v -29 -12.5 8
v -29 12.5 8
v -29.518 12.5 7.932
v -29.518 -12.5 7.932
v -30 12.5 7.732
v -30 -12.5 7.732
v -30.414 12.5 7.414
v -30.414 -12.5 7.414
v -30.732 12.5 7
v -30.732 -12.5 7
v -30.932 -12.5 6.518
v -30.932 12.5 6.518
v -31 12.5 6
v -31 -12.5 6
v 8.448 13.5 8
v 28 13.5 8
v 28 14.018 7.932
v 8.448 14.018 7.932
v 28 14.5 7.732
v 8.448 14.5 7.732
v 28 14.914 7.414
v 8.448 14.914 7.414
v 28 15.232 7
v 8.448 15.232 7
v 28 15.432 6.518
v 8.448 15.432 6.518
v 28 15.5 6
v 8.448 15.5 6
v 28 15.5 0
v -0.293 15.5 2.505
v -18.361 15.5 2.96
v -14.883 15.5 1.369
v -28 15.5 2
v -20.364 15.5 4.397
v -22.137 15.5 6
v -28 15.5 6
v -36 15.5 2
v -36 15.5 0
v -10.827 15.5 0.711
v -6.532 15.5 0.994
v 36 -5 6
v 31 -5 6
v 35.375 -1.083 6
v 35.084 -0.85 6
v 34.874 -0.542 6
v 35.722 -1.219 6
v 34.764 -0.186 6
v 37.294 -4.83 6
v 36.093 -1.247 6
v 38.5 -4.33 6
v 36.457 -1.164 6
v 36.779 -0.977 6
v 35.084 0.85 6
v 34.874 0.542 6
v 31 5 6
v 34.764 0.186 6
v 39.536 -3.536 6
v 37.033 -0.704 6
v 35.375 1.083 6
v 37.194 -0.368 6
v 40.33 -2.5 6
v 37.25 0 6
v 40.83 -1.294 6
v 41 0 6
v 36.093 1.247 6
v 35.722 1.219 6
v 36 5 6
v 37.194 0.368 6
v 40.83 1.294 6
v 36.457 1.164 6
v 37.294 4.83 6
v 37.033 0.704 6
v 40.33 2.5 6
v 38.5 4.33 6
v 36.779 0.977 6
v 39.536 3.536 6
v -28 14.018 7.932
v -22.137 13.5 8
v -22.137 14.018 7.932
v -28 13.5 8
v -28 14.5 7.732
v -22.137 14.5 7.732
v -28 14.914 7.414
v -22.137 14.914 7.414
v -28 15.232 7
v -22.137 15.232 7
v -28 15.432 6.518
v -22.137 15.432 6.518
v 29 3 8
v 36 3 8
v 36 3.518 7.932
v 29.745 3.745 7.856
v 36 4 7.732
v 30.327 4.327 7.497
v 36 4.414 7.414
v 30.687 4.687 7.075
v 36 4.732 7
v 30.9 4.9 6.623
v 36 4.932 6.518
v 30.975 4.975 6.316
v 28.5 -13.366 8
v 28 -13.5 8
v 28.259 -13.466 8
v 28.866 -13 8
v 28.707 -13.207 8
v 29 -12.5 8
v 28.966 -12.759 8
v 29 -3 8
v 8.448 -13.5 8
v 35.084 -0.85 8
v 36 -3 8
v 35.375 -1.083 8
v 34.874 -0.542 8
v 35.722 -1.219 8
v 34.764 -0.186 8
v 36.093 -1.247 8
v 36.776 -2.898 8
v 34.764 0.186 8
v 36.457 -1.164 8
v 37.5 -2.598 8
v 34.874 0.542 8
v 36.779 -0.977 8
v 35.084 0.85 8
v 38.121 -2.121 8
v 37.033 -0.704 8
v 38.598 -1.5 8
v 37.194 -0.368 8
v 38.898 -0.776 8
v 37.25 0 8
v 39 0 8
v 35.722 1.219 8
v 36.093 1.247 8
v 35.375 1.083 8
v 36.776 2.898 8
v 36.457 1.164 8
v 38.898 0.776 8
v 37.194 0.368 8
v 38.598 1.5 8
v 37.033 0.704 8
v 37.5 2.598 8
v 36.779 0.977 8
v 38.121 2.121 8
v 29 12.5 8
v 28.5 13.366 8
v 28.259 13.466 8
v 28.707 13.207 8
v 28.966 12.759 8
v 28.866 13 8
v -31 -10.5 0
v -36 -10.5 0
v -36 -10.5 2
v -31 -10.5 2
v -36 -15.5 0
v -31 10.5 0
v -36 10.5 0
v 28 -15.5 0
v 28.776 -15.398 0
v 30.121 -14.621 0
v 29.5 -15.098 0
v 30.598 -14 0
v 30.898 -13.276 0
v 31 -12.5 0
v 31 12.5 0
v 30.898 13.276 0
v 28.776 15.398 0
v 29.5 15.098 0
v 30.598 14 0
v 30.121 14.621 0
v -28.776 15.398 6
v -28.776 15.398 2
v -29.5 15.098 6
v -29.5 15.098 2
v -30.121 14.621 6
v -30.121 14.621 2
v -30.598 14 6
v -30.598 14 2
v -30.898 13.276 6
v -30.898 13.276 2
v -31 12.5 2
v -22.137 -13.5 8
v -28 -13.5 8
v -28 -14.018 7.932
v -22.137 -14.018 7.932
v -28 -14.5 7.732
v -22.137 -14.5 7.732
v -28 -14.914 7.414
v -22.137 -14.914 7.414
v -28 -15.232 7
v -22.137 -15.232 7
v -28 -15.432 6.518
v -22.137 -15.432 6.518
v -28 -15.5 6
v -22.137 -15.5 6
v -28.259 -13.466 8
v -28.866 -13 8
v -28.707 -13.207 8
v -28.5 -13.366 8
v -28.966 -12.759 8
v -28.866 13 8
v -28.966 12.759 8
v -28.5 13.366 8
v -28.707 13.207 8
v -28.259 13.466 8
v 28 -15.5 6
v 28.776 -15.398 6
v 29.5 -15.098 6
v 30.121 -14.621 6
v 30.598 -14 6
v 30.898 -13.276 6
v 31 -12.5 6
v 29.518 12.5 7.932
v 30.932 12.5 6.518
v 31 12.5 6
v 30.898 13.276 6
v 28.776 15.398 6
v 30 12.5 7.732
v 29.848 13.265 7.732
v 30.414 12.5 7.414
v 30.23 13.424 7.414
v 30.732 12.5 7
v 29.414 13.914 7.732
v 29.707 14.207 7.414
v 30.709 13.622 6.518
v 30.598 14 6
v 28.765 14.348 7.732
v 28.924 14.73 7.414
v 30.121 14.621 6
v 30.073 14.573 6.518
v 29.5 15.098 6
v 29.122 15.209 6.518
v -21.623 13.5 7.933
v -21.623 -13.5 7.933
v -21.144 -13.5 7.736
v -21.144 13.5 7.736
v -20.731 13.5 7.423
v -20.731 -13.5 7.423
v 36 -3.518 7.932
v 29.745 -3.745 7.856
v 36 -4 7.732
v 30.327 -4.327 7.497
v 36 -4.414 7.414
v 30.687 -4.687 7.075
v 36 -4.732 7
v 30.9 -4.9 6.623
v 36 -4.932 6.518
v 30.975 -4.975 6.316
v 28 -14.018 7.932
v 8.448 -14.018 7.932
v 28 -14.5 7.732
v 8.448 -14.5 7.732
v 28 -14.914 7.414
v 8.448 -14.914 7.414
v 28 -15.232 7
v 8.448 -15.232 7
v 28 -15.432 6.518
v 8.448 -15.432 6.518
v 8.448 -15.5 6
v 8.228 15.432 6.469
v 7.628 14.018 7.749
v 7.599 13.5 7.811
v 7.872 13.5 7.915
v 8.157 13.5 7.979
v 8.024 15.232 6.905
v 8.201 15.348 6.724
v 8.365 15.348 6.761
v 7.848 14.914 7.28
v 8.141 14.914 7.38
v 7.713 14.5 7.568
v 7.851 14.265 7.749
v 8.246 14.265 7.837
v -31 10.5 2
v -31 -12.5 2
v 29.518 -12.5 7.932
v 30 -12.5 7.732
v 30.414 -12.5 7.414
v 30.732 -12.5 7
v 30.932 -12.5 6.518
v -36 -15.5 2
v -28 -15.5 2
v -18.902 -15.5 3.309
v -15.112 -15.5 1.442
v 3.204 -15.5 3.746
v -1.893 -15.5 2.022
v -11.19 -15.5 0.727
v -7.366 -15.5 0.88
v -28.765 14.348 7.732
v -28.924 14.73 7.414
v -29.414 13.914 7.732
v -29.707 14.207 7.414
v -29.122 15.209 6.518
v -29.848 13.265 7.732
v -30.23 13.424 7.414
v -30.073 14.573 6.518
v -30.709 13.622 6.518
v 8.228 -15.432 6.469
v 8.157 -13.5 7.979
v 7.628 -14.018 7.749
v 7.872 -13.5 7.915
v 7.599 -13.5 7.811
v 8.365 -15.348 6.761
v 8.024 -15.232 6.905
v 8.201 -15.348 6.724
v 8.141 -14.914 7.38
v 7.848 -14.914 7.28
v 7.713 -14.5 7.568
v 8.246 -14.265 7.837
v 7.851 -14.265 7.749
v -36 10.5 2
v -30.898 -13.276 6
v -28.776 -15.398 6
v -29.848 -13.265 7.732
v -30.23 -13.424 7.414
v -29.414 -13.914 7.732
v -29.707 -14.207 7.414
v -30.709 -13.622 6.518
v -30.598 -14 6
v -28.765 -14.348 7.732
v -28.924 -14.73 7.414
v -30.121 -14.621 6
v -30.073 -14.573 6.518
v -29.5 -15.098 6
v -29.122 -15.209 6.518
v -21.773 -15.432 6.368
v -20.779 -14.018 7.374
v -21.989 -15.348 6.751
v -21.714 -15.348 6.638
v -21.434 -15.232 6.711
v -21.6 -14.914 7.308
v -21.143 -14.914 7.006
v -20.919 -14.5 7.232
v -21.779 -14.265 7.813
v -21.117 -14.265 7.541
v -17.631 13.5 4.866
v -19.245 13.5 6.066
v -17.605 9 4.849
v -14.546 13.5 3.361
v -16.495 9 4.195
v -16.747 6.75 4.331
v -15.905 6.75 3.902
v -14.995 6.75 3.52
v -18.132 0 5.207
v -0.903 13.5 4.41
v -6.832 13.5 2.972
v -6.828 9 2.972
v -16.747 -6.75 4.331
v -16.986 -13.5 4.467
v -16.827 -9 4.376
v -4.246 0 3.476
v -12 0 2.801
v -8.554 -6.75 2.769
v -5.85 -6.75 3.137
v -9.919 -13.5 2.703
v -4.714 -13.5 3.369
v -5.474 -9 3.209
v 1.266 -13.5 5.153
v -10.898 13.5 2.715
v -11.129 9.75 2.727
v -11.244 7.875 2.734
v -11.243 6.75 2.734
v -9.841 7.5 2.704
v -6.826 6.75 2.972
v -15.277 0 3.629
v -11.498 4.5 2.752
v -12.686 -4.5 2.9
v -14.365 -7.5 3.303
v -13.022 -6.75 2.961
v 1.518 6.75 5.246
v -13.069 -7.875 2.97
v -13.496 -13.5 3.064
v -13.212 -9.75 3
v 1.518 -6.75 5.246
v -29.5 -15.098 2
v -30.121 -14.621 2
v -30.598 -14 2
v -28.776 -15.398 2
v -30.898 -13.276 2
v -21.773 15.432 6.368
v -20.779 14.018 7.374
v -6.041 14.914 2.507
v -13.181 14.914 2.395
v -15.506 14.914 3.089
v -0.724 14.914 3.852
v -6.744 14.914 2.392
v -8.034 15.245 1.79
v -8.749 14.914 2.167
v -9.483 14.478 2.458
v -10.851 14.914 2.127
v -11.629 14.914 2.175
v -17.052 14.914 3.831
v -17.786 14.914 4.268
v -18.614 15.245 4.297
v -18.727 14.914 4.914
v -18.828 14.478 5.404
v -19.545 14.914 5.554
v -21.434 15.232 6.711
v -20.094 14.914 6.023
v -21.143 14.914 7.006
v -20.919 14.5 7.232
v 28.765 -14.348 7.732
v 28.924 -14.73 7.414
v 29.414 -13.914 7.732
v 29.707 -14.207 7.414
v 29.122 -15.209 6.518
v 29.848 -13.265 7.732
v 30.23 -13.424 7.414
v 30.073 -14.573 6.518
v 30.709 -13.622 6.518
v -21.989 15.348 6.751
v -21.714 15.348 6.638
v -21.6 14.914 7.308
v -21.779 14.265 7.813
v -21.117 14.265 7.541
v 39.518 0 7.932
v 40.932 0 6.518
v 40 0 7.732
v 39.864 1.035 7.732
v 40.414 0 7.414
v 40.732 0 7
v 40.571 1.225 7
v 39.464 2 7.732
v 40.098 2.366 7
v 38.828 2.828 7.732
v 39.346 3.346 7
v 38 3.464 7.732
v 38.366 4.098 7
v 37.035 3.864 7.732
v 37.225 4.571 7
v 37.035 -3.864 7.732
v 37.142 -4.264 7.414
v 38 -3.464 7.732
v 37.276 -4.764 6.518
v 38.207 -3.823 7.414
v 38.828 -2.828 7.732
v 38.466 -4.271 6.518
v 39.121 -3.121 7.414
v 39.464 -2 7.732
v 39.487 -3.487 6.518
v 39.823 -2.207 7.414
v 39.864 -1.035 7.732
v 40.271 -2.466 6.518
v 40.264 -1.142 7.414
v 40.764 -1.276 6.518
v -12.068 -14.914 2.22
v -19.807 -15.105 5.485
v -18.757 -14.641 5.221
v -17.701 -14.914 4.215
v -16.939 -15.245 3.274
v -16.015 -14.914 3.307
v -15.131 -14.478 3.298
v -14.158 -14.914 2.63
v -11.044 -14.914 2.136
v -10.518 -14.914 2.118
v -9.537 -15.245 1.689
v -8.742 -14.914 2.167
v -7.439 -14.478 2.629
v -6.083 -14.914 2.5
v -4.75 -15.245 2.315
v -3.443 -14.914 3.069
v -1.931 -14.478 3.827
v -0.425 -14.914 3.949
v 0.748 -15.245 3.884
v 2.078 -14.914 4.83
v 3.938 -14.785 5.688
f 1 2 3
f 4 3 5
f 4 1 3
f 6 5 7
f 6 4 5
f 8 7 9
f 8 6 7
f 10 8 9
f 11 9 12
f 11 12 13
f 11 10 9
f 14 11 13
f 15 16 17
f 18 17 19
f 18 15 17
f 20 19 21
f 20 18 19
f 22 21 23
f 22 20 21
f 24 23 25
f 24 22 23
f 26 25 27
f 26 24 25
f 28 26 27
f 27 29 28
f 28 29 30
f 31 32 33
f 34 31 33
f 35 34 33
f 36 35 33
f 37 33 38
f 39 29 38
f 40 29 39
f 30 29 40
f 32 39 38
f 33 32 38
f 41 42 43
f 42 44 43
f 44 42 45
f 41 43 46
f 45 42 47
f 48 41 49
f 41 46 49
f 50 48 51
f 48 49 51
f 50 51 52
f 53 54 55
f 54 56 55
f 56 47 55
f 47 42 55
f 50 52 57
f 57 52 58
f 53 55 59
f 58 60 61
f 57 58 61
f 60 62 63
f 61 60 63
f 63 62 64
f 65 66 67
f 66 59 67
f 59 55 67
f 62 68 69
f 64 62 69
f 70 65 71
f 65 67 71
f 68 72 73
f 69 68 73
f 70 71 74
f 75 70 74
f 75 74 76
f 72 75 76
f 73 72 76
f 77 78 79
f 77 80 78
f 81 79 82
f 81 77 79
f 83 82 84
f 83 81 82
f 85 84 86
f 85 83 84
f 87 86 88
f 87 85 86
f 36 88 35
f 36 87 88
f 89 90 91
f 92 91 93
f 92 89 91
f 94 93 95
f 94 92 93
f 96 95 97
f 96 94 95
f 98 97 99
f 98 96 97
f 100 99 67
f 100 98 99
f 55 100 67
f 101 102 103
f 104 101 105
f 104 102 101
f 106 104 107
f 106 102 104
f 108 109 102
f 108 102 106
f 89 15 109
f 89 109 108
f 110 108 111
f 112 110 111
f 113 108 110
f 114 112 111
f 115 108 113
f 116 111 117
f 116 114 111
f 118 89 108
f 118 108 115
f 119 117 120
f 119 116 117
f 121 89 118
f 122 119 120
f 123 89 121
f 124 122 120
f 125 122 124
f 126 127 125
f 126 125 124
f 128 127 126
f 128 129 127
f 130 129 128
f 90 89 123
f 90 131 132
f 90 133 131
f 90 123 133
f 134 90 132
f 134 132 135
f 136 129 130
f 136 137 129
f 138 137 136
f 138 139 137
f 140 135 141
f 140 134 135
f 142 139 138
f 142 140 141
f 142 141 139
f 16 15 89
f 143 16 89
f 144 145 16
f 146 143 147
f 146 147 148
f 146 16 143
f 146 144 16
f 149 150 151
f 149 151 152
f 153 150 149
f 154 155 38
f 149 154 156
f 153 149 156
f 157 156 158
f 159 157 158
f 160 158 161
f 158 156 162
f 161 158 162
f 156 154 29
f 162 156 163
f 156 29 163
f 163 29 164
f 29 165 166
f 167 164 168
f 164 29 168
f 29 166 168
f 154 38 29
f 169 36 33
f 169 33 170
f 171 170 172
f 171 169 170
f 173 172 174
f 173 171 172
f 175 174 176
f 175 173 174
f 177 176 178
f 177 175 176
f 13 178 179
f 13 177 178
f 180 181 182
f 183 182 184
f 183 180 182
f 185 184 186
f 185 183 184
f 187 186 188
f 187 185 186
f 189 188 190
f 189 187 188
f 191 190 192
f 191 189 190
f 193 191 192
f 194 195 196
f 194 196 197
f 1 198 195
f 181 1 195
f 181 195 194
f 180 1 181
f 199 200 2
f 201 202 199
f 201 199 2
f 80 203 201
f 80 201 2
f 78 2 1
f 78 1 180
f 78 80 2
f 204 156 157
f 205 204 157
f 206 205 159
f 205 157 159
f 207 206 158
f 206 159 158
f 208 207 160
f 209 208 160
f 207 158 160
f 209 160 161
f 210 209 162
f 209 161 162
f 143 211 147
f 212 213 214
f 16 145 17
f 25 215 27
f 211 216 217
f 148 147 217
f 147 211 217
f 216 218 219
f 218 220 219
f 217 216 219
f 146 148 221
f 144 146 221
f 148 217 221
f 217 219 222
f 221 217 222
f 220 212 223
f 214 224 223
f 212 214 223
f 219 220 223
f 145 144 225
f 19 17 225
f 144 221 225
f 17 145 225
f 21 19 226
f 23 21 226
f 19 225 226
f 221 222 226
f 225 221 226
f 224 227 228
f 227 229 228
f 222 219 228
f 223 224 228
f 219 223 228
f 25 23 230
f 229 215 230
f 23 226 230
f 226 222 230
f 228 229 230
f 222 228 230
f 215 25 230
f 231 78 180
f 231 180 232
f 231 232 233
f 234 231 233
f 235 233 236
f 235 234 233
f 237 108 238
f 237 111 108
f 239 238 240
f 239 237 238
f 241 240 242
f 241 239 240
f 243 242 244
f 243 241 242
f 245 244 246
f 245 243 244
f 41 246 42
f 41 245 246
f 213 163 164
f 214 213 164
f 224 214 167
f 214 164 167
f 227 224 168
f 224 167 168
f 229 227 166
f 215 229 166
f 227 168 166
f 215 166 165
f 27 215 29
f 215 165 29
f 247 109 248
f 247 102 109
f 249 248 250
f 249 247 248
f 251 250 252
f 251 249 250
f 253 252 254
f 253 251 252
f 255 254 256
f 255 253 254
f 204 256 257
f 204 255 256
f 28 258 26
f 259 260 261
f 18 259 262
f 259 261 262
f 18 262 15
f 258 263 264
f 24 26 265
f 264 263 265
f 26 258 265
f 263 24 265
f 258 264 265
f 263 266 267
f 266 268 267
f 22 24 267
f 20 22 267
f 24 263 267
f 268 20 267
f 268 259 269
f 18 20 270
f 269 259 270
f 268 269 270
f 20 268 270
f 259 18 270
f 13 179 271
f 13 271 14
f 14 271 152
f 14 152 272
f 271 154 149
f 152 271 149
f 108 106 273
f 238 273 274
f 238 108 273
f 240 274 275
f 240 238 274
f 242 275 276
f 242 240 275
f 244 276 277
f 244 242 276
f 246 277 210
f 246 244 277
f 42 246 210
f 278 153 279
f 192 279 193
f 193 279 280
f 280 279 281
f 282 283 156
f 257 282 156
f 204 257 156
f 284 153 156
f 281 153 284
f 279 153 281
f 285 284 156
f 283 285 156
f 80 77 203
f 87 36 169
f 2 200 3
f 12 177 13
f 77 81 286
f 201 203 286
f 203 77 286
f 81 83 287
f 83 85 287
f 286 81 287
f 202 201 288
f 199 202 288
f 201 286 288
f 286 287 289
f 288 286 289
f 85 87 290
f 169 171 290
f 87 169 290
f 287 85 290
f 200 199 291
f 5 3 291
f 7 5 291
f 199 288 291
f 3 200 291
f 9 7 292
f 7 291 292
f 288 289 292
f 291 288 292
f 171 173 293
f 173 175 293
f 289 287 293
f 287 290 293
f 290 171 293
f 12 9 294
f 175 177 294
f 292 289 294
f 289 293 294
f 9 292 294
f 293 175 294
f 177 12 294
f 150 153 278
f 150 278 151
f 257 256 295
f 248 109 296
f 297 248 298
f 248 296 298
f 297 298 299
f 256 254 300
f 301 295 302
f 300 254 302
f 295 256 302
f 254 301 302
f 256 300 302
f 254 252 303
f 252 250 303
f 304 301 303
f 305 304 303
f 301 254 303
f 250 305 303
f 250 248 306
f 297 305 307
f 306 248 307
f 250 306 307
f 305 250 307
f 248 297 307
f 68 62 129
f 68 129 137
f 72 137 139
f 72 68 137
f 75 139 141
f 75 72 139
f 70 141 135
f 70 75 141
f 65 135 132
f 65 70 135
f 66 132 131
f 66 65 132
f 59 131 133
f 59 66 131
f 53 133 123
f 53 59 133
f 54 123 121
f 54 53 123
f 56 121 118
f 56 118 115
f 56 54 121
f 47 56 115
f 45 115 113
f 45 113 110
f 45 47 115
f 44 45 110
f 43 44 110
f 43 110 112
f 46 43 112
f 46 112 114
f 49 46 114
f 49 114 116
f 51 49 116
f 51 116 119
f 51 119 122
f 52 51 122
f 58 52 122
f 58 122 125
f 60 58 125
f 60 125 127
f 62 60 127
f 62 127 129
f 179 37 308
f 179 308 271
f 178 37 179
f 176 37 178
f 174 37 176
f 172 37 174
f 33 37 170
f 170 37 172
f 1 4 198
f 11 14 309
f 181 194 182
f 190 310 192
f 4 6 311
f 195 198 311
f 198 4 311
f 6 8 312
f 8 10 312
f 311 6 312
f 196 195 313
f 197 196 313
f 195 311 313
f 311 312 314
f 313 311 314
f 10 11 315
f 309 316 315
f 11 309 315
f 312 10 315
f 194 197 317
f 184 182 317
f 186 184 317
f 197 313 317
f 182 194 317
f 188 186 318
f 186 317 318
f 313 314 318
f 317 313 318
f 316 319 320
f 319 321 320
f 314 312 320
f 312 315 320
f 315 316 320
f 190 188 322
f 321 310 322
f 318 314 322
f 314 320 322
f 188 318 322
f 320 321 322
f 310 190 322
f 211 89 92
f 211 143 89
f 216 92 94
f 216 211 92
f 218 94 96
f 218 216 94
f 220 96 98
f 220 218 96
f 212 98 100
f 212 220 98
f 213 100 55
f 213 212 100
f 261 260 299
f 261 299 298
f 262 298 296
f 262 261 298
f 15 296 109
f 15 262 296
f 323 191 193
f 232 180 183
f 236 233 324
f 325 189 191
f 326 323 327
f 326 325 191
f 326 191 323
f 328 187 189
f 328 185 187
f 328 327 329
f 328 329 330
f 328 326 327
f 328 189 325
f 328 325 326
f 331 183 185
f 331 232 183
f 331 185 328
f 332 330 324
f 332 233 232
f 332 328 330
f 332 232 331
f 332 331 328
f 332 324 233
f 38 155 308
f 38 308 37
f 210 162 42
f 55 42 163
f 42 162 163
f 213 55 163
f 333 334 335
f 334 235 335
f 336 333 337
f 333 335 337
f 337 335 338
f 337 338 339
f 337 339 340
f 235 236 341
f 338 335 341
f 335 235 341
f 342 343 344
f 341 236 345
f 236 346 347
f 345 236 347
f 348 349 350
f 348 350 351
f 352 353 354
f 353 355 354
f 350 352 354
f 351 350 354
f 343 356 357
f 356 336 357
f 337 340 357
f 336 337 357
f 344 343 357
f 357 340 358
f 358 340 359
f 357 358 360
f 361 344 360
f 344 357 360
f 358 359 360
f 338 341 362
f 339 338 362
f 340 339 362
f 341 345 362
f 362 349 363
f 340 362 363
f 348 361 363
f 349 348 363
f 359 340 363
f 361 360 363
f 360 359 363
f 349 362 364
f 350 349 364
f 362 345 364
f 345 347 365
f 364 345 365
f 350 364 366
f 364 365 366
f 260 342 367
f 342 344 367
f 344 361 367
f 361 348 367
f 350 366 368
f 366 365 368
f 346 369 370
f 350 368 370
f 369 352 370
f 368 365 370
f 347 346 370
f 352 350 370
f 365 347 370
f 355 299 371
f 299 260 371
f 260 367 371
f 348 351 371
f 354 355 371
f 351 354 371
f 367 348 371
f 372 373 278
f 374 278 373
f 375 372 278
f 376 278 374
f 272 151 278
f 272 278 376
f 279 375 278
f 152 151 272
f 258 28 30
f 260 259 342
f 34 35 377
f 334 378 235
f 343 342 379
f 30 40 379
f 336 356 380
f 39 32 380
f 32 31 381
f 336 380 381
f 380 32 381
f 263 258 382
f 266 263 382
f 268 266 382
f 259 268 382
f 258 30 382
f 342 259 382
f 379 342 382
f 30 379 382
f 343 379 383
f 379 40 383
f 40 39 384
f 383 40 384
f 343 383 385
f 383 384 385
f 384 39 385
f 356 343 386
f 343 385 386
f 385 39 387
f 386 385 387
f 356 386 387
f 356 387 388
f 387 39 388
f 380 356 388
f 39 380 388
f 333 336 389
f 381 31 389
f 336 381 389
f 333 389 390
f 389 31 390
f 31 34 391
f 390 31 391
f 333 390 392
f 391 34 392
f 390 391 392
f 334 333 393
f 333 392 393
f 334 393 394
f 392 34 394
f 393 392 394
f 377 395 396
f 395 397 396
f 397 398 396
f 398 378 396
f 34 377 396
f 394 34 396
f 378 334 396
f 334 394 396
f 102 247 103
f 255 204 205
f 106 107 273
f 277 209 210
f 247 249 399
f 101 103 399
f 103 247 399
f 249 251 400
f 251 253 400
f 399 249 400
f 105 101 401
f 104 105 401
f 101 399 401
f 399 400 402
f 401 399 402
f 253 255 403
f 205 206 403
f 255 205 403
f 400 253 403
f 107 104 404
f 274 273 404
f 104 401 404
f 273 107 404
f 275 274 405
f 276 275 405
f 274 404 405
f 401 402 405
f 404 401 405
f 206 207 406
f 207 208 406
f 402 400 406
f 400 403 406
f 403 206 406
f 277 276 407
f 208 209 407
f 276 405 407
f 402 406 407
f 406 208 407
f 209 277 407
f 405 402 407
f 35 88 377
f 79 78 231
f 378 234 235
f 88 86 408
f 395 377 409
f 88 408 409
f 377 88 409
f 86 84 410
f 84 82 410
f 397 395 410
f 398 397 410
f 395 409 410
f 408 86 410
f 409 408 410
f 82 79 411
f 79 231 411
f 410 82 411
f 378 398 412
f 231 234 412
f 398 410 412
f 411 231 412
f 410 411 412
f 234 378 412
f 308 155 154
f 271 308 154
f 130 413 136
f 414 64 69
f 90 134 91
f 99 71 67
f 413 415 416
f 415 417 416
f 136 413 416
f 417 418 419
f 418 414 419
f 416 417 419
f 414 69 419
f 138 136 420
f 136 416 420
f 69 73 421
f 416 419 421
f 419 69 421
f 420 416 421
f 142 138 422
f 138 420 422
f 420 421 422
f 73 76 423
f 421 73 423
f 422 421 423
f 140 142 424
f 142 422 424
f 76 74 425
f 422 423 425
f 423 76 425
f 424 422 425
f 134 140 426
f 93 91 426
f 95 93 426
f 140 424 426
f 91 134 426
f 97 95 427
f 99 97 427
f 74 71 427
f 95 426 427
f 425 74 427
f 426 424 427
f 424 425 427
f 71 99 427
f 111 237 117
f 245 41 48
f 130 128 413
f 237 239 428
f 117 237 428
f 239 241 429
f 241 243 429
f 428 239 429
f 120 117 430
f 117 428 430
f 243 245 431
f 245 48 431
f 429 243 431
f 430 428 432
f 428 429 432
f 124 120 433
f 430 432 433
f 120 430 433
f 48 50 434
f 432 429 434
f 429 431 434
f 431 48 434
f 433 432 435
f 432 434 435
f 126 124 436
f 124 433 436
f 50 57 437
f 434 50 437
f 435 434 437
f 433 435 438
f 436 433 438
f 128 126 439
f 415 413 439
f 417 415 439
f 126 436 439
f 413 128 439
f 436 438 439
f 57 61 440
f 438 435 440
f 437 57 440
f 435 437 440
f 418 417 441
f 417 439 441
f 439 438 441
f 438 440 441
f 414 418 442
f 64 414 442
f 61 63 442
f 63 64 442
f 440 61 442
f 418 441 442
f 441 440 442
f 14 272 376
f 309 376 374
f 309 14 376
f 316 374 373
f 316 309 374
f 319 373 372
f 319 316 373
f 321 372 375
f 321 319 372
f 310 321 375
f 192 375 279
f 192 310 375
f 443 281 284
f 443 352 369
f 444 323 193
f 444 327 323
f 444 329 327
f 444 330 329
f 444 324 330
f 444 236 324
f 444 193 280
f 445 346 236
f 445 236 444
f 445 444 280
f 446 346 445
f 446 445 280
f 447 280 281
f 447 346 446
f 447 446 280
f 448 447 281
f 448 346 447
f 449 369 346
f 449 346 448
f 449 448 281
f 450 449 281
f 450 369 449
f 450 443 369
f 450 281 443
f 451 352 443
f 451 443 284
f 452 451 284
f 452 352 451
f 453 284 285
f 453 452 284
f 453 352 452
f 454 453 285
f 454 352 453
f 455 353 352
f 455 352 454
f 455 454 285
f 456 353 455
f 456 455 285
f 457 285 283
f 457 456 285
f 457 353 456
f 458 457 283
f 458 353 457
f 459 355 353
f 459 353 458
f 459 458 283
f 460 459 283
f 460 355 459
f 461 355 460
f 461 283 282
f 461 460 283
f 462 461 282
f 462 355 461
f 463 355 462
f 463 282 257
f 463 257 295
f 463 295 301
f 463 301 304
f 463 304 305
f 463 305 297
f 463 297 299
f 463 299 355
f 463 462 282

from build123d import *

# Parameters (mm, degrees)
F0_W     = 5
F0_H     = 5
F1_DEPTH = 2
F0_R     = 1.25
F2_DEPTH = 8
F3_DEPTH = 6
F5_R     = 3
F6_DEPTH = 50
F7_R     = 1.99999


# Not quite as in the source:
# - a fillet or chamfer is up to 0.001 mm smaller than in the source, because OpenCascade refuses the exact size


with BuildPart() as f1:
    # F0 (on Top) → F1 (new body)
    with BuildSketch(Plane.XY):
        with Locations((-33.5, 13)):
            Rectangle(F0_W, F0_H)
        with BuildLine():
            Line((-31, -15.5), (28, -15.5))
            ThreePointArc((28, -15.5), (30.1213203436, -14.6213203436), (31, -12.5))
            Line((31, -12.5), (31, -5))
            Line((31, -5), (31, 5))
            Line((31, 5), (31, 12.5))
            ThreePointArc((31, 12.5), (30.1213203436, 14.6213203436), (28, 15.5))
            Line((28, 15.5), (-31, 15.5))
            Line((-31, 15.5), (-31, 10.5))
            Line((-31, 10.5), (-31, -10.5))
            Line((-31, -10.5), (-31, -15.5))
        make_face()
        with Locations((-33.5, -13)):
            Rectangle(F0_W, F0_H)
    extrude(amount=F1_DEPTH)

    # F0 (on Top) → F2 (join)
    with BuildSketch(Plane.XY):
        with BuildLine():
            Line((31, 5), (31, -5))
            Line((31, -5), (36, -5))
            ThreePointArc((36, -5), (39.5355339059, -3.5355339059), (41, 0))
            ThreePointArc((41, 0), (39.5355339059, 3.5355339059), (36, 5))
            Line((36, 5), (31, 5))
        make_face()
        with Locations((36, 0)):
            Circle(F0_R, mode=Mode.SUBTRACT)
        with BuildLine():
            Line((-31, -15.5), (28, -15.5))
            ThreePointArc((28, -15.5), (30.1213203436, -14.6213203436), (31, -12.5))
            Line((31, -12.5), (31, -5))
            Line((31, -5), (31, 5))
            Line((31, 5), (31, 12.5))
            ThreePointArc((31, 12.5), (30.1213203436, 14.6213203436), (28, 15.5))
            Line((28, 15.5), (-31, 15.5))
            Line((-31, 15.5), (-31, 10.5))
            Line((-31, 10.5), (-31, -10.5))
            Line((-31, -10.5), (-31, -15.5))
        make_face()
    extrude(amount=F2_DEPTH)

    # F0 (on Top) → F3 (cut)
    with BuildSketch(Plane.XY):
        with BuildLine():
            Line((31, 5), (31, -5))
            Line((31, -5), (36, -5))
            ThreePointArc((36, -5), (39.5355339059, -3.5355339059), (41, 0))
            ThreePointArc((41, 0), (39.5355339059, 3.5355339059), (36, 5))
            Line((36, 5), (31, 5))
        make_face()
        with Locations((36, 0)):
            Circle(F0_R, mode=Mode.SUBTRACT)
    extrude(amount=F3_DEPTH, mode=Mode.SUBTRACT)

    # F5
    f5_edges = [f1.edges().sort_by_distance(p)[0] for p in [
        (-31, 15.5, 5),
        (-31, -15.5, 5),
    ]]
    fillet(f5_edges, radius=F5_R)

    # F4 (on face) → F6 (cut)
    with BuildSketch(Plane.XZ.offset(15.5)):
        with BuildLine():
            Line((8, 8), (-21.3, 8))
            add(Edge.make_bspline(
                [(-21.3, 8), (-18.6027030945, 5.1925020669), (-11.9176320955, 0.5356481102), (0.5768376855, 4.4751283983), (8, 8)],
                knots=[0, 0, 0, 0, 0.4179419715, 1, 1, 1, 1], degree=3))
        make_face()
    extrude(amount=-F6_DEPTH, mode=Mode.SUBTRACT)

    # F7 (radius 2 in the source; OpenCascade refuses exactly that, so slightly less here)
    f7_edges = [f1.edges().sort_by_distance(p)[0] for p in [
        (33.5, -5, 8),
        (30.12132, -14.62132, 8),
        (-7.010651, -15.5, 2.945097),
        (8, 0, 8),
        (-7.010651, 15.5, 2.945097),
        (-21.3, 0, 8),
        (33.5, 5, 8),
        (31, 8.75, 8),
        (30.12132, 14.62132, 8),
        (-24.65, -15.5, 8),
        (-30.12132, -14.62132, 8),
        (-31, 0, 8),
        (-30.12132, 14.62132, 8),
        (-24.65, 15.5, 8),
        (18, -15.5, 8),
        (31, -8.75, 8),
        (41, 0, 8),
        (18, 15.5, 8),
    ]]
    fillet(f7_edges, radius=F7_R)


solid = f1.part
